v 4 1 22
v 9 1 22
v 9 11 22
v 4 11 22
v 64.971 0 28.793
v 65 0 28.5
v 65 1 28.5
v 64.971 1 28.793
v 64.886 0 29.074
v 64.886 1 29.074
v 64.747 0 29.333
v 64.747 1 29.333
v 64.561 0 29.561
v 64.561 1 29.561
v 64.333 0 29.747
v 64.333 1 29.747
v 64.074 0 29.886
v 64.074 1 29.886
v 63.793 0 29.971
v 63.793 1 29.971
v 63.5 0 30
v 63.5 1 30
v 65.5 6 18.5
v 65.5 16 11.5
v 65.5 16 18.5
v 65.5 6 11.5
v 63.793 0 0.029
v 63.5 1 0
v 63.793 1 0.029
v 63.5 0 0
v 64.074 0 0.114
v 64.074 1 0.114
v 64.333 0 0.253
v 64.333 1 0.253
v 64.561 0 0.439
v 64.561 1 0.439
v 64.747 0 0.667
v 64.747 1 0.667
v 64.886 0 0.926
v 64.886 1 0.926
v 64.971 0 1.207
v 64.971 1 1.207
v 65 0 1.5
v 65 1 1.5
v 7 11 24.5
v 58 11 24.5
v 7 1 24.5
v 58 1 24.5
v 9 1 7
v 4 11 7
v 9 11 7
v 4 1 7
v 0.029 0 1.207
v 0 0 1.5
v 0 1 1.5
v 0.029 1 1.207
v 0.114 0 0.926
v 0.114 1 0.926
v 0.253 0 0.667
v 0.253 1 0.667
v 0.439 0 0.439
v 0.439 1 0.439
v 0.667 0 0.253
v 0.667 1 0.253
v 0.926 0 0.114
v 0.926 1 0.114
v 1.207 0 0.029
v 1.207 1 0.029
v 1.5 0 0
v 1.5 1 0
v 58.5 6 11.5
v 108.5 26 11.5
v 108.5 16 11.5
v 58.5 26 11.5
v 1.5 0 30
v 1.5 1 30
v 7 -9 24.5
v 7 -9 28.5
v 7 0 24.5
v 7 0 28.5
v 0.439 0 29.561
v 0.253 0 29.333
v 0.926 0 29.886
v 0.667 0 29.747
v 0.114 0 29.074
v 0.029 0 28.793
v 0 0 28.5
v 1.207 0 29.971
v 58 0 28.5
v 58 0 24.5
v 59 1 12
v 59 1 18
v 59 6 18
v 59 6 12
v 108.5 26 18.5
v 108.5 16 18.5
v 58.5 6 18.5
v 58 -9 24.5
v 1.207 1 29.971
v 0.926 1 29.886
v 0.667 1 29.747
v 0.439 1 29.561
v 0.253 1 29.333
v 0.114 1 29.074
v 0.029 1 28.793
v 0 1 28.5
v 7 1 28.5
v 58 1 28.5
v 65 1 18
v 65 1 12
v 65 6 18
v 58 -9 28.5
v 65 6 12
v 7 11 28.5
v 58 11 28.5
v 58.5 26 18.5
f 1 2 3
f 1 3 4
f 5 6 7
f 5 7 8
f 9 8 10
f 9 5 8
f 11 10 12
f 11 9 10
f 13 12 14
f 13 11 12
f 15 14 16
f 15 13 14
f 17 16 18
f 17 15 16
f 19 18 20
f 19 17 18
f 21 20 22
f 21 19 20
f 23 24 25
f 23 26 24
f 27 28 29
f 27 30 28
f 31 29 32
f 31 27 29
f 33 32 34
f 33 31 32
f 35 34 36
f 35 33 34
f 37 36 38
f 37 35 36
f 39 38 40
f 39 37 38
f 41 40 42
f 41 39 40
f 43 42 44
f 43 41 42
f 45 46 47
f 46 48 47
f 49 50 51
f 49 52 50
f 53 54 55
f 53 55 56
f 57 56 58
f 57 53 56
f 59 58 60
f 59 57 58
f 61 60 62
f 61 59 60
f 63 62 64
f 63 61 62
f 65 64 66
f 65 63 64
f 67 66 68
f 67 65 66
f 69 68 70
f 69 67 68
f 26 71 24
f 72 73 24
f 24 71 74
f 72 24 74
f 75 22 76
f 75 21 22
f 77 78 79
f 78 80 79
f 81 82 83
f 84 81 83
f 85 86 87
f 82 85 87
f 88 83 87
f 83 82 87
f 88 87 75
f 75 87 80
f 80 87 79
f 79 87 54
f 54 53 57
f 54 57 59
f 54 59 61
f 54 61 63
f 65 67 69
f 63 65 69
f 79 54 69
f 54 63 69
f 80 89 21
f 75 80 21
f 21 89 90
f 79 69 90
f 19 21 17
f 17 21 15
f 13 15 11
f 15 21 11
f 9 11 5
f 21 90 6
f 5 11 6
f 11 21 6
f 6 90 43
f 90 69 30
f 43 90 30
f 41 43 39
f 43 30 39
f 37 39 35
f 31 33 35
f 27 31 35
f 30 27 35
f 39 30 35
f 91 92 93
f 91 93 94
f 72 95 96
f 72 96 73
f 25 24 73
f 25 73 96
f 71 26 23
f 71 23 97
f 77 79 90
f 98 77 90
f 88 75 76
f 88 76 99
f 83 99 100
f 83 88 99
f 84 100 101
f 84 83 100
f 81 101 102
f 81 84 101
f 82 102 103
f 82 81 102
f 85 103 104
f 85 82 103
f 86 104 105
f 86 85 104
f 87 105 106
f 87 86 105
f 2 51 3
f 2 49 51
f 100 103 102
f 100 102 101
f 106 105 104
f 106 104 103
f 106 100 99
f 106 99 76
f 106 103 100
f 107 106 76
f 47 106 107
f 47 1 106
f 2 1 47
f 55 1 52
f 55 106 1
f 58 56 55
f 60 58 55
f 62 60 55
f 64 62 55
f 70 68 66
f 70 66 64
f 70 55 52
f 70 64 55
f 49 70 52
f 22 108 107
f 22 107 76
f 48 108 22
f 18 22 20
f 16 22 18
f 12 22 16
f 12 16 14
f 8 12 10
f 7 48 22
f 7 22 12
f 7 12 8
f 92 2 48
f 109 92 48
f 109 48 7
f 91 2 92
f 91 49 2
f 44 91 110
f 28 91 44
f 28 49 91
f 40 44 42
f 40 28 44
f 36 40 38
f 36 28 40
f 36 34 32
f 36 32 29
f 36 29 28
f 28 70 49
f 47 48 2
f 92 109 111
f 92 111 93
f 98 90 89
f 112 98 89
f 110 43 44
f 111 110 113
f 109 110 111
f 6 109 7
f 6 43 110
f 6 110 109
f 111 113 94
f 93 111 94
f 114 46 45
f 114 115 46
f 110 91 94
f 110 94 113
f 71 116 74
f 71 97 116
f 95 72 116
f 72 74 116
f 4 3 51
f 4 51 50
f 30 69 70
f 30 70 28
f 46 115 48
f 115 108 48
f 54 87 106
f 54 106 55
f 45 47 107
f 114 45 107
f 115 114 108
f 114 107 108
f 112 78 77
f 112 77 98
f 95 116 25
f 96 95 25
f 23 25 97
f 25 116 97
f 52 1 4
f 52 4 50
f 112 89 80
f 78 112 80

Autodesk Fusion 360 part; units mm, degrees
sketch "Sketch1" plane through (0, 0, 0) normal (0, 1, 0) x (1, 0, 0)
  line L0 (1.5, 0) -> (63.5, 0)
  line L1 (65, -1.5) -> (65, -28.5)
  line L2 (63.5, -30) -> (1.5, -30)
  line L3 (0, -28.5) -> (0, -1.5)
  arc A0 (1.5, 0) -> (0, -1.5) centre (1.5, -1.5) ccw
  arc A1 (65, -1.5) -> (63.5, 0) centre (63.5, -1.5) ccw
  arc A2 (63.5, -30) -> (65, -28.5) centre (63.5, -28.5) ccw
  arc A3 (0, -28.5) -> (1.5, -30) centre (1.5, -28.5) ccw
  point P0 (65, 0)
  point P1 (0, -30)
  dimension "d1" = 65
  dimension "d2" = 30
  dimension "d3" = 1.5
  dimension "d4" = 1.5
  dimension "d5" = 1.5
  dimension "d6" = 1.5
extrude "Extrude6" add sketch "Sketch1" along normal blind 1 makes body 1
sketch "Sketch4" plane through (0, 1, 0) normal (0, 1, 0) x (-1, 0, 0)
  arc A0 (-1.5, 0) -> (0, 1.5) centre (-1.5, 1.5) ccw
  line L0 (0, 1.5) -> (0, 28.5)
  arc A1 (0, 28.5) -> (-1.5, 30) centre (-1.5, 28.5) ccw
  line L1 (-1.5, 30) -> (-63.5, 30)
  arc A2 (-63.5, 30) -> (-65, 28.5) centre (-63.5, 28.5) ccw
  line L2 (-65, 28.5) -> (-65, 1.5)
  arc A3 (-65, 1.5) -> (-63.5, 0) centre (-63.5, 1.5) ccw
  line L3 (-63.5, 0) -> (-1.5, 0)
  line L4 (0, 28.5) -> (-7, 28.5) construction
  line L5 (-65, 28.5) -> (-58, 28.5) construction
  line L6 (-7, 28.5) -> (-58, 28.5)
  line L7 (-58, 28.5) -> (-58, 24.5)
  line L8 (-58, 24.5) -> (-7, 24.5)
  line L9 (-7, 24.5) -> (-7, 28.5)
  dimension "d20" = 7
  dimension "d21" = 7
  dimension "d22" = 4
  dimension "d57" = 7
  dimension "d58" = 7
extrude "Extrude7" add sketch "Sketch4" along normal blind 10 contours L6 L7 L8 L9 bodies 1
sketch "Sketch6" plane through (0, 1, 0) normal (0, 1, 0) x (-1, 0, 0)
  line L0 (-7, 24.5) -> (-58, 24.5)
  line L1 (-58, 24.5) -> (-58, 28.5)
  line L2 (-58, 28.5) -> (-7, 28.5)
  line L3 (-7, 28.5) -> (-7, 24.5)
  arc A0 (-1.5, 0) -> (0, 1.5) centre (-1.5, 1.5) ccw
  line L4 (0, 1.5) -> (0, 28.5)
  arc A1 (0, 28.5) -> (-1.5, 30) centre (-1.5, 28.5) ccw
  line L5 (-1.5, 30) -> (-63.5, 30)
  arc A2 (-63.5, 30) -> (-65, 28.5) centre (-63.5, 28.5) ccw
  line L6 (-65, 28.5) -> (-65, 1.5)
  arc A3 (-65, 1.5) -> (-63.5, 0) centre (-63.5, 1.5) ccw
  line L7 (-63.5, 0) -> (-1.5, 0)
  line L8 (-59, 12) -> (-65, 12)
  line L9 (-65, 12) -> (-65, 18)
  line L10 (-65, 18) -> (-59, 18)
  line L11 (-59, 18) -> (-59, 12)
  line L12 (-1.5, 0) -> (-63.5, 0)
  line L13 (-63.5, 30) -> (-1.5, 30)
  line L14 (-65, 1.5) -> (-65, 28.5)
  dimension "d29" = 6
  dimension "d30" = 6
extrude "Extrude8" add sketch "Sketch6" along normal blind 5 contours L6 L8 L9 L10 L11 L14 bodies 1
sketch "Sketch7" plane through (0, 1, 0) normal (0, 1, 0) x (-1, 0, 0)
  line L0 (-65, 18) -> (-59, 18)
  line L1 (-59, 18) -> (-59, 12)
  line L2 (-59, 12) -> (-65, 12)
  line L3 (-65, 12) -> (-65, 1.5)
  arc A0 (-65, 1.5) -> (-63.5, 0) centre (-63.5, 1.5) ccw
  line L4 (-63.5, 0) -> (-1.5, 0)
  arc A1 (-1.5, 0) -> (0, 1.5) centre (-1.5, 1.5) ccw
  line L5 (0, 1.5) -> (0, 28.5)
  arc A2 (0, 28.5) -> (-1.5, 30) centre (-1.5, 28.5) ccw
  line L6 (-1.5, 30) -> (-63.5, 30)
  arc A3 (-63.5, 30) -> (-65, 28.5) centre (-63.5, 28.5) ccw
  line L7 (-65, 28.5) -> (-65, 18)
  line L8 (-7, 24.5) -> (-58, 24.5)
  line L9 (-58, 24.5) -> (-58, 28.5)
  line L10 (-58, 28.5) -> (-7, 28.5)
  line L11 (-7, 28.5) -> (-7, 24.5)
  line L12 (-4, 7) -> (-9, 7)
  line L13 (-9, 7) -> (-9, 22)
  line L14 (-9, 22) -> (-4, 22)
  line L15 (-4, 22) -> (-4, 7)
  line L16 (0, 28.5) -> (0, 1.5)
  line L17 (-1.5, 0) -> (-63.5, 0)
  dimension "d38" = 5
  dimension "d39" = 15
  dimension "d40" = 4
  dimension "d41" = 7
extrude "Extrude9" add sketch "Sketch7" along normal blind 10 contours L12 L13 L14 L15 bodies 1
sketch "Sketch8" plane through (0, 6, 0) normal (0, 1, 0) x (-1, 0, 0)
  line L0 (-59, 12) -> (-59, 18)
  line L1 (-59, 18) -> (-65, 18)
  line L2 (-65, 18) -> (-65, 12)
  line L3 (-65, 12) -> (-59, 12)
  line L4 (-58.5, 11.5) -> (-65.5, 11.5)
  line L5 (-65.5, 11.5) -> (-65.5, 18.5)
  line L6 (-65.5, 18.5) -> (-58.5, 18.5)
  line L7 (-58.5, 18.5) -> (-58.5, 11.5)
  line L8 (-58.5, 11.5) -> (-65.5, 18.5) construction
  line L9 (-65.5, 11.5) -> (-58.5, 18.5) construction
  point P0 (-62, 15)
  point P1 (-62, 15)
  dimension "d46" = 3
  dimension "d47" = 3
  dimension "d48" = 7
  dimension "d49" = 7
extrude "Extrude1" add sketch "Sketch8" along normal blind 20 separate body contours L0 L1 L2 L3 | L4 L5 L6 L7 makes body 2 in component "Antenna"
sketch "Sketch1 (2)" plane through (65.5, 0, 0) normal (1, 0, 0) x (0, 0, -1) in component "Antenna"
  line L0 (-18.5, 6) -> (-11.5, 6)
  line L1 (-11.5, 6) -> (-11.5, 26)
  line L2 (-11.5, 26) -> (-18.5, 26)
  line L3 (-18.5, 26) -> (-18.5, 6)
  line L4 (-18.5, 26) -> (-11.5, 26)
  line L5 (-11.5, 26) -> (-11.5, 16)
  line L6 (-11.5, 16) -> (-18.5, 16)
  line L7 (-18.5, 16) -> (-18.5, 26)
  dimension "d52" = 10
extrude "Extrude2" add sketch "Sketch1 (2)" along normal blind 43 contours L1 L2 L3 L4 L5 L6 L7 bodies 2 in component "Antenna"
sketch "Sketch10" plane through (0, 0, 0) normal (0, -1, 0) x (1, 0, 0)
  arc A0 (0, 1.5) -> (1.5, 0) centre (1.5, 1.5) ccw
  line L0 (1.5, 0) -> (63.5, 0)
  arc A1 (63.5, 0) -> (65, 1.5) centre (63.5, 1.5) ccw
  line L1 (65, 1.5) -> (65, 28.5)
  arc A2 (65, 28.5) -> (63.5, 30) centre (63.5, 28.5) ccw
  line L2 (63.5, 30) -> (1.5, 30)
  arc A3 (1.5, 30) -> (0, 28.5) centre (1.5, 28.5) ccw
  line L3 (0, 28.5) -> (0, 1.5)
  line L4 (7, 24.5) -> (58, 24.5) construction
  line L5 (58, 24.5) -> (58, 28.5) construction
  line L6 (58, 28.5) -> (7, 28.5) construction
  line L7 (7, 28.5) -> (7, 24.5) construction
  line L8 (7, 24.5) -> (58, 24.5)
  line L9 (58, 24.5) -> (58, 28.5)
  line L10 (58, 28.5) -> (7, 28.5)
  line L11 (7, 28.5) -> (7, 24.5)
extrude "Extrude10" add sketch "Sketch10" along normal blind 9 contours L8 L9 L10 L11 bodies 1
component "Antenna" placed x (1, 0, 0) y (0, 1, 0) z (0, 0, 1) at (0, 0, 0)
